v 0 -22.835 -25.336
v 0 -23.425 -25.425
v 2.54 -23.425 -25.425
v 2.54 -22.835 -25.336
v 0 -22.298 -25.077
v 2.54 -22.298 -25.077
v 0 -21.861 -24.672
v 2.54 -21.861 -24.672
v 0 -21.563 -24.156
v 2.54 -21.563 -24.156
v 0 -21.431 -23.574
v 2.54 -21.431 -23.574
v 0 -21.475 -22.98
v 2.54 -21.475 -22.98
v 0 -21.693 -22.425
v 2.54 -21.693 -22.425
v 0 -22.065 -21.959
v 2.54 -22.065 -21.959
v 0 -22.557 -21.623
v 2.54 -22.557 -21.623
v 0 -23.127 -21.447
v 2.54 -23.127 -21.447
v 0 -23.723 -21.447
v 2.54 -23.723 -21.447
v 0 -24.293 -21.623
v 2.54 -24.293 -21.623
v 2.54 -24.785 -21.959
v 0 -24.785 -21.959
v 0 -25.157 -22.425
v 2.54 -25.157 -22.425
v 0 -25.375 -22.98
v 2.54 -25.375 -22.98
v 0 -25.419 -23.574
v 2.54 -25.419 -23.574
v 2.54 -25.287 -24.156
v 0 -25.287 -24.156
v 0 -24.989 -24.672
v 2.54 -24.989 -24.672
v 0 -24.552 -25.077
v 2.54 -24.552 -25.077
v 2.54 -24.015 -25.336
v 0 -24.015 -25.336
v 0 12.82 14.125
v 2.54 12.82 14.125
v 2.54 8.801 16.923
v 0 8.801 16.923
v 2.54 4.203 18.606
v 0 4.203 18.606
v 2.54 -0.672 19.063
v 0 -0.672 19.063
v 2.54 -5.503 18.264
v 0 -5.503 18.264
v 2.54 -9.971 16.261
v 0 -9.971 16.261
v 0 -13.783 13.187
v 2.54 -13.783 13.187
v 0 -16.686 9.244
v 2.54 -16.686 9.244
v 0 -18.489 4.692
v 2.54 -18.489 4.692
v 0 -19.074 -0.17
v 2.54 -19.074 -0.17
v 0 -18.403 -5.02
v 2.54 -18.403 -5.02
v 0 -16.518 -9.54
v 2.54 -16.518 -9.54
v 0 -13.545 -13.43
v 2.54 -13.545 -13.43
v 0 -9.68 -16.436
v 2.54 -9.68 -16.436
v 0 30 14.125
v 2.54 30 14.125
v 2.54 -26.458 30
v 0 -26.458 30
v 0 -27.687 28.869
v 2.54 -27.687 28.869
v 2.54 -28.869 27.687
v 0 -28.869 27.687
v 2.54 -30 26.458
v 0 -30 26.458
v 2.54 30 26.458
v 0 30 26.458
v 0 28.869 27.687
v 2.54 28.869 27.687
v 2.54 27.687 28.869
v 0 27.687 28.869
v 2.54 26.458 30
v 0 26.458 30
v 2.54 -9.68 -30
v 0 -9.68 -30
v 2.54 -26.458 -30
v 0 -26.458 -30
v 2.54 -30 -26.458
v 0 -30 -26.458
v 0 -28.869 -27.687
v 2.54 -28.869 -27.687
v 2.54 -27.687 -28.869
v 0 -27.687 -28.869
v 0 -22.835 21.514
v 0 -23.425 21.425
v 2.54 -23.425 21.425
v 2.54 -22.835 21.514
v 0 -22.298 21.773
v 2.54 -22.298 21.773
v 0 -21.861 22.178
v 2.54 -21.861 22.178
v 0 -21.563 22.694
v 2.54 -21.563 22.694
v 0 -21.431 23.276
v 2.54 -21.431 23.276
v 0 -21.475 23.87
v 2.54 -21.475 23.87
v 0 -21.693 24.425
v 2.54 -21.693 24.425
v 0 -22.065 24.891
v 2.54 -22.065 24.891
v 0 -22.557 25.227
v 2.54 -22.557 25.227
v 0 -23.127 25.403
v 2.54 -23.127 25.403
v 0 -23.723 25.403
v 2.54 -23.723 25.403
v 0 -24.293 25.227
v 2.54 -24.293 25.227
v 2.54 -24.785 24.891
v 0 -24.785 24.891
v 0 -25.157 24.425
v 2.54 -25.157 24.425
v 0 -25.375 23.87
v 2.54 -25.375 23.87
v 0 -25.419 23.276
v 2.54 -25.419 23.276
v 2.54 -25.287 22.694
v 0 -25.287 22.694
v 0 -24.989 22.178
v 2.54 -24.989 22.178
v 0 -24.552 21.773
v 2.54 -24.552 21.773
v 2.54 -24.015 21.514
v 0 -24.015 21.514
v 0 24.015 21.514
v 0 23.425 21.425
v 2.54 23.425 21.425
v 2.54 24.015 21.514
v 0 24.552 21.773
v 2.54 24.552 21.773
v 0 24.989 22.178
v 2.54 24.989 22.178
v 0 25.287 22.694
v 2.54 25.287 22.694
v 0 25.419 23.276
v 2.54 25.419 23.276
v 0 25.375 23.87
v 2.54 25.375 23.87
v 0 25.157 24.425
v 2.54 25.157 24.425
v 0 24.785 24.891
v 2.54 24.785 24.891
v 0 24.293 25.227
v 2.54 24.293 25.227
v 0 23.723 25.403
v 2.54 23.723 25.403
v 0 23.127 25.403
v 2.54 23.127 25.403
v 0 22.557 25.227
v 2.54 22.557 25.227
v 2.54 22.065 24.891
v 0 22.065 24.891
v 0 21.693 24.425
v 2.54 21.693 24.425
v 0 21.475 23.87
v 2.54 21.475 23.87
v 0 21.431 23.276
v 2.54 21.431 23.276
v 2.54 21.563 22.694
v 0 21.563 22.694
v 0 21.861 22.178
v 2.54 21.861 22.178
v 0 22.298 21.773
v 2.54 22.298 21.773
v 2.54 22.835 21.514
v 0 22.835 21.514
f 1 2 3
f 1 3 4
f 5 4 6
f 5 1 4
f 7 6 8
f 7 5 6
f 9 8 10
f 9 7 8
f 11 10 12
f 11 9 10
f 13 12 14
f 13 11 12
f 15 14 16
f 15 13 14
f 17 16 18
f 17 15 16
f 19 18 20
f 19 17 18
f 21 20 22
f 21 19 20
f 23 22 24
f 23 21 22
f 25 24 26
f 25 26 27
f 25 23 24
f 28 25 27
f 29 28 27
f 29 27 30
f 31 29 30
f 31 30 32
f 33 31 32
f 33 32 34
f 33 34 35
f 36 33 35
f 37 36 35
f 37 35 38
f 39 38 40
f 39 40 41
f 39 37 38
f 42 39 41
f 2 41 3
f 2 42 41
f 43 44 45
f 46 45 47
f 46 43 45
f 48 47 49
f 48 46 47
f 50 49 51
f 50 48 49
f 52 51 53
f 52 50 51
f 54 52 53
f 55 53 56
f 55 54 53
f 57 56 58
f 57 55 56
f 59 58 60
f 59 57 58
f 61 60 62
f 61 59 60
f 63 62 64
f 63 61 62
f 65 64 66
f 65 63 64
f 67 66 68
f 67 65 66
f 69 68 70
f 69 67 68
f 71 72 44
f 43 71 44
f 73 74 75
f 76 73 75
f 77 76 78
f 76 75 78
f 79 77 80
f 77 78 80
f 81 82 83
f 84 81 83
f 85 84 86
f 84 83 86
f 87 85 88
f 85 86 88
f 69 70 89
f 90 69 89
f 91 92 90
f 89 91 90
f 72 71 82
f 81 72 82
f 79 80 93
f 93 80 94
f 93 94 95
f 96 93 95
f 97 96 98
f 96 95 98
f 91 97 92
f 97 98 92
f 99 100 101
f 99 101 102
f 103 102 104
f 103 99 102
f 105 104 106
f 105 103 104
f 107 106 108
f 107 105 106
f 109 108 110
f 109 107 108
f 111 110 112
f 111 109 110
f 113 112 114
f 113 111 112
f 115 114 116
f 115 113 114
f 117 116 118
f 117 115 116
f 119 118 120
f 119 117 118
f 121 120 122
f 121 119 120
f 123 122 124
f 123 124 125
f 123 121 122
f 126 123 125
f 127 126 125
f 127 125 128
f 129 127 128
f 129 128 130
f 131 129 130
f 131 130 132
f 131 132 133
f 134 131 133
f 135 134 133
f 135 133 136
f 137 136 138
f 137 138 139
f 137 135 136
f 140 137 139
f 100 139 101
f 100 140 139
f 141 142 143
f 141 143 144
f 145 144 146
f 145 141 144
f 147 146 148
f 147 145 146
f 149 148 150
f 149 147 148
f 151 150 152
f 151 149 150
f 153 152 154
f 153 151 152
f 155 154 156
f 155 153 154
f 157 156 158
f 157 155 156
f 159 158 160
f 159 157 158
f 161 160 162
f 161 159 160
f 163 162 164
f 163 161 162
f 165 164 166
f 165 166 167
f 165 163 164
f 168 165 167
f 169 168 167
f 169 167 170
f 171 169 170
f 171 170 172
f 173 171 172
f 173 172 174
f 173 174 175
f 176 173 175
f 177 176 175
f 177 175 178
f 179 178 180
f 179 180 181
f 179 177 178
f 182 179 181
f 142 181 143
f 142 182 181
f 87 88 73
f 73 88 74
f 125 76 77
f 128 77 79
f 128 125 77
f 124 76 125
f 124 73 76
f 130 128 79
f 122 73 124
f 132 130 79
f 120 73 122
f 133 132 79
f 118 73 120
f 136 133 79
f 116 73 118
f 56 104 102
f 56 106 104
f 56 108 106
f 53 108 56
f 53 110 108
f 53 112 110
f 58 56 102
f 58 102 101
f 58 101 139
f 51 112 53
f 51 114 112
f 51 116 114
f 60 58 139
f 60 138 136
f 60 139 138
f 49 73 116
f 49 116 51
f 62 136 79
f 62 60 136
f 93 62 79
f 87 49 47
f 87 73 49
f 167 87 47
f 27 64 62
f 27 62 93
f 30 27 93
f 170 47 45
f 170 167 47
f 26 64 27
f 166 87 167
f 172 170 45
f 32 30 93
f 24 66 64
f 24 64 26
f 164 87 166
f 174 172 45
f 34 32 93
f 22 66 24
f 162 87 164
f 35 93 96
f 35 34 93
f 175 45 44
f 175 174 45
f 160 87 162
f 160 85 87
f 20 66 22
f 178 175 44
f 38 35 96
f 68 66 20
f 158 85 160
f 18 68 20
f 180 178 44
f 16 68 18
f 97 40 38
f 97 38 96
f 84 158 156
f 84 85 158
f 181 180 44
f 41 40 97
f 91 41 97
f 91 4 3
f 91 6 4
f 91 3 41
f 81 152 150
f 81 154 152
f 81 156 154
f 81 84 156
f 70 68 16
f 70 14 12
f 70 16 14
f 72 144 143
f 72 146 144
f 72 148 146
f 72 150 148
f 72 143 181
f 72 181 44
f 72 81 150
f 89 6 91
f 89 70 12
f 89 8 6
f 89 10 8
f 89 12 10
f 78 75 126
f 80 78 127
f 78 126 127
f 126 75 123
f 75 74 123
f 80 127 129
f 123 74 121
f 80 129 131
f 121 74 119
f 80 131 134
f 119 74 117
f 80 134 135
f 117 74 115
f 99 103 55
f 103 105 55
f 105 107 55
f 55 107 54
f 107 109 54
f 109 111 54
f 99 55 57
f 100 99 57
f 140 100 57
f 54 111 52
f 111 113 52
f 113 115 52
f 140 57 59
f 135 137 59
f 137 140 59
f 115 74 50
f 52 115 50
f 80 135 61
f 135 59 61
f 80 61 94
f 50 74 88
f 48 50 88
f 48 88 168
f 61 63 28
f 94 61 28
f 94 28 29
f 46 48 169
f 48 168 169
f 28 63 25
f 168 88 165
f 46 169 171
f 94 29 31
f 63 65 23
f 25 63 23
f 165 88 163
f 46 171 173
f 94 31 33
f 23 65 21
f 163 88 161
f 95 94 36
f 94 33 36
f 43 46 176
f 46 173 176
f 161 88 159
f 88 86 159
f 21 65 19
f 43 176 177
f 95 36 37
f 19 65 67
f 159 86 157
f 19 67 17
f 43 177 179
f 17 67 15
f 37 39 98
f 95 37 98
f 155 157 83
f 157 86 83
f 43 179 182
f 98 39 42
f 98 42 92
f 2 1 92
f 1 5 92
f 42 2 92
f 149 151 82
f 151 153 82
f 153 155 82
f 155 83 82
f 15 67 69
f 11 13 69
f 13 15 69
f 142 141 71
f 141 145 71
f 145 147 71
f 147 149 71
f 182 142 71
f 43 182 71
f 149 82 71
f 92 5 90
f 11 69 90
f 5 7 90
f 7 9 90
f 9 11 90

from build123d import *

# Parameters (mm, degrees)
SKETCH1_R           = 19.075
SKETCH1_R_2         = 2.675
BOSS_EXTRUDE1_DEPTH = 2.54
BOSS_EXTRUDE2_START = -2.54
SKETCH2_R           = 2.675
SKETCH2_R_2         = 2
BOSS_EXTRUDE2_DEPTH = 2.54
CUT_EXTRUDE1_DEPTH  = 43.502371699


with BuildPart() as part:
    # Sketch1 → Boss-Extrude1 (new body)
    with BuildSketch(Plane(origin=(0, 0, 0), x_dir=(0, 0, -1), z_dir=(1, 0, 0))):
        with BuildLine():
            Line((-30, 26.457513111), (-30, -26.457513111))
            ThreePointArc((-30, -26.457513111), (-28.284271247, -28.284271247), (-26.457513111, -30))
            Line((-26.457513111, -30), (26.457513111, -30))
            ThreePointArc((26.457513111, -30), (28.284271247, -28.284271247), (30, -26.457513111))
            Line((30, -26.457513111), (30, 26.457513111))
            ThreePointArc((30, 26.457513111), (28.284271247, 28.284271247), (26.457513111, 30))
            Line((26.457513111, 30), (-26.457513111, 30))
            ThreePointArc((-26.457513111, 30), (-28.284271247, 28.284271247), (-30, 26.457513111))
        make_face()
        Circle(SKETCH1_R, mode=Mode.SUBTRACT)
        with Locations((-23.425, -23.425)):
            Circle(SKETCH1_R_2, mode=Mode.SUBTRACT)
        with Locations((23.425, -23.425)):
            Circle(SKETCH1_R_2, mode=Mode.SUBTRACT)
        with Locations((23.425, 23.425)):
            Circle(SKETCH1_R_2, mode=Mode.SUBTRACT)
        with Locations((-23.425, 23.425)):
            Circle(SKETCH1_R_2, mode=Mode.SUBTRACT)
    extrude(amount=BOSS_EXTRUDE1_DEPTH)

    # Sketch2 → Boss-Extrude2 (add)
    # profile 1 of 4: a face of its own
    with BuildSketch(Plane(origin=(2.54, 0, 0), x_dir=(0, 0, -1), z_dir=(1, 0, 0)).offset(BOSS_EXTRUDE2_START)):
        with Locations((-23.425, -23.425)):
            Circle(SKETCH2_R)
        with Locations((-23.425, -23.425)):
            Circle(SKETCH2_R_2, mode=Mode.SUBTRACT)
    # profile 2 of 4: a face of its own
    with BuildSketch(Plane(origin=(2.54, 0, 0), x_dir=(0, 0, -1), z_dir=(1, 0, 0)).offset(BOSS_EXTRUDE2_START)):
        with Locations((23.425, 23.425)):
            Circle(SKETCH2_R)
        with Locations((23.425, 23.425)):
            Circle(SKETCH2_R_2, mode=Mode.SUBTRACT)
    # profile 3 of 4: a face of its own
    with BuildSketch(Plane(origin=(2.54, 0, 0), x_dir=(0, 0, -1), z_dir=(1, 0, 0)).offset(BOSS_EXTRUDE2_START)):
        with Locations((23.425, -23.425)):
            Circle(SKETCH2_R)
        with Locations((23.425, -23.425)):
            Circle(SKETCH2_R_2, mode=Mode.SUBTRACT)
    # profile 4 of 4: a face of its own
    with BuildSketch(Plane(origin=(2.54, 0, 0), x_dir=(0, 0, -1), z_dir=(1, 0, 0)).offset(BOSS_EXTRUDE2_START)):
        with Locations((-23.425, 23.425)):
            Circle(SKETCH2_R)
        with Locations((-23.425, 23.425)):
            Circle(SKETCH2_R_2, mode=Mode.SUBTRACT)
    extrude(amount=BOSS_EXTRUDE2_DEPTH)

    # Sketch3 → Cut-Extrude1 (cut, through all)
    with BuildSketch(Plane(origin=(2.54, 0, 0), x_dir=(0, 0, -1), z_dir=(1, 0, 0))):
        Polygon((-14.125, 30), (-14.125, 12.819516372), (16.436338552, -9.68), (30, -9.68), (30, 30), align=None)
    extrude(amount=-CUT_EXTRUDE1_DEPTH, mode=Mode.SUBTRACT)


solid = part.part
